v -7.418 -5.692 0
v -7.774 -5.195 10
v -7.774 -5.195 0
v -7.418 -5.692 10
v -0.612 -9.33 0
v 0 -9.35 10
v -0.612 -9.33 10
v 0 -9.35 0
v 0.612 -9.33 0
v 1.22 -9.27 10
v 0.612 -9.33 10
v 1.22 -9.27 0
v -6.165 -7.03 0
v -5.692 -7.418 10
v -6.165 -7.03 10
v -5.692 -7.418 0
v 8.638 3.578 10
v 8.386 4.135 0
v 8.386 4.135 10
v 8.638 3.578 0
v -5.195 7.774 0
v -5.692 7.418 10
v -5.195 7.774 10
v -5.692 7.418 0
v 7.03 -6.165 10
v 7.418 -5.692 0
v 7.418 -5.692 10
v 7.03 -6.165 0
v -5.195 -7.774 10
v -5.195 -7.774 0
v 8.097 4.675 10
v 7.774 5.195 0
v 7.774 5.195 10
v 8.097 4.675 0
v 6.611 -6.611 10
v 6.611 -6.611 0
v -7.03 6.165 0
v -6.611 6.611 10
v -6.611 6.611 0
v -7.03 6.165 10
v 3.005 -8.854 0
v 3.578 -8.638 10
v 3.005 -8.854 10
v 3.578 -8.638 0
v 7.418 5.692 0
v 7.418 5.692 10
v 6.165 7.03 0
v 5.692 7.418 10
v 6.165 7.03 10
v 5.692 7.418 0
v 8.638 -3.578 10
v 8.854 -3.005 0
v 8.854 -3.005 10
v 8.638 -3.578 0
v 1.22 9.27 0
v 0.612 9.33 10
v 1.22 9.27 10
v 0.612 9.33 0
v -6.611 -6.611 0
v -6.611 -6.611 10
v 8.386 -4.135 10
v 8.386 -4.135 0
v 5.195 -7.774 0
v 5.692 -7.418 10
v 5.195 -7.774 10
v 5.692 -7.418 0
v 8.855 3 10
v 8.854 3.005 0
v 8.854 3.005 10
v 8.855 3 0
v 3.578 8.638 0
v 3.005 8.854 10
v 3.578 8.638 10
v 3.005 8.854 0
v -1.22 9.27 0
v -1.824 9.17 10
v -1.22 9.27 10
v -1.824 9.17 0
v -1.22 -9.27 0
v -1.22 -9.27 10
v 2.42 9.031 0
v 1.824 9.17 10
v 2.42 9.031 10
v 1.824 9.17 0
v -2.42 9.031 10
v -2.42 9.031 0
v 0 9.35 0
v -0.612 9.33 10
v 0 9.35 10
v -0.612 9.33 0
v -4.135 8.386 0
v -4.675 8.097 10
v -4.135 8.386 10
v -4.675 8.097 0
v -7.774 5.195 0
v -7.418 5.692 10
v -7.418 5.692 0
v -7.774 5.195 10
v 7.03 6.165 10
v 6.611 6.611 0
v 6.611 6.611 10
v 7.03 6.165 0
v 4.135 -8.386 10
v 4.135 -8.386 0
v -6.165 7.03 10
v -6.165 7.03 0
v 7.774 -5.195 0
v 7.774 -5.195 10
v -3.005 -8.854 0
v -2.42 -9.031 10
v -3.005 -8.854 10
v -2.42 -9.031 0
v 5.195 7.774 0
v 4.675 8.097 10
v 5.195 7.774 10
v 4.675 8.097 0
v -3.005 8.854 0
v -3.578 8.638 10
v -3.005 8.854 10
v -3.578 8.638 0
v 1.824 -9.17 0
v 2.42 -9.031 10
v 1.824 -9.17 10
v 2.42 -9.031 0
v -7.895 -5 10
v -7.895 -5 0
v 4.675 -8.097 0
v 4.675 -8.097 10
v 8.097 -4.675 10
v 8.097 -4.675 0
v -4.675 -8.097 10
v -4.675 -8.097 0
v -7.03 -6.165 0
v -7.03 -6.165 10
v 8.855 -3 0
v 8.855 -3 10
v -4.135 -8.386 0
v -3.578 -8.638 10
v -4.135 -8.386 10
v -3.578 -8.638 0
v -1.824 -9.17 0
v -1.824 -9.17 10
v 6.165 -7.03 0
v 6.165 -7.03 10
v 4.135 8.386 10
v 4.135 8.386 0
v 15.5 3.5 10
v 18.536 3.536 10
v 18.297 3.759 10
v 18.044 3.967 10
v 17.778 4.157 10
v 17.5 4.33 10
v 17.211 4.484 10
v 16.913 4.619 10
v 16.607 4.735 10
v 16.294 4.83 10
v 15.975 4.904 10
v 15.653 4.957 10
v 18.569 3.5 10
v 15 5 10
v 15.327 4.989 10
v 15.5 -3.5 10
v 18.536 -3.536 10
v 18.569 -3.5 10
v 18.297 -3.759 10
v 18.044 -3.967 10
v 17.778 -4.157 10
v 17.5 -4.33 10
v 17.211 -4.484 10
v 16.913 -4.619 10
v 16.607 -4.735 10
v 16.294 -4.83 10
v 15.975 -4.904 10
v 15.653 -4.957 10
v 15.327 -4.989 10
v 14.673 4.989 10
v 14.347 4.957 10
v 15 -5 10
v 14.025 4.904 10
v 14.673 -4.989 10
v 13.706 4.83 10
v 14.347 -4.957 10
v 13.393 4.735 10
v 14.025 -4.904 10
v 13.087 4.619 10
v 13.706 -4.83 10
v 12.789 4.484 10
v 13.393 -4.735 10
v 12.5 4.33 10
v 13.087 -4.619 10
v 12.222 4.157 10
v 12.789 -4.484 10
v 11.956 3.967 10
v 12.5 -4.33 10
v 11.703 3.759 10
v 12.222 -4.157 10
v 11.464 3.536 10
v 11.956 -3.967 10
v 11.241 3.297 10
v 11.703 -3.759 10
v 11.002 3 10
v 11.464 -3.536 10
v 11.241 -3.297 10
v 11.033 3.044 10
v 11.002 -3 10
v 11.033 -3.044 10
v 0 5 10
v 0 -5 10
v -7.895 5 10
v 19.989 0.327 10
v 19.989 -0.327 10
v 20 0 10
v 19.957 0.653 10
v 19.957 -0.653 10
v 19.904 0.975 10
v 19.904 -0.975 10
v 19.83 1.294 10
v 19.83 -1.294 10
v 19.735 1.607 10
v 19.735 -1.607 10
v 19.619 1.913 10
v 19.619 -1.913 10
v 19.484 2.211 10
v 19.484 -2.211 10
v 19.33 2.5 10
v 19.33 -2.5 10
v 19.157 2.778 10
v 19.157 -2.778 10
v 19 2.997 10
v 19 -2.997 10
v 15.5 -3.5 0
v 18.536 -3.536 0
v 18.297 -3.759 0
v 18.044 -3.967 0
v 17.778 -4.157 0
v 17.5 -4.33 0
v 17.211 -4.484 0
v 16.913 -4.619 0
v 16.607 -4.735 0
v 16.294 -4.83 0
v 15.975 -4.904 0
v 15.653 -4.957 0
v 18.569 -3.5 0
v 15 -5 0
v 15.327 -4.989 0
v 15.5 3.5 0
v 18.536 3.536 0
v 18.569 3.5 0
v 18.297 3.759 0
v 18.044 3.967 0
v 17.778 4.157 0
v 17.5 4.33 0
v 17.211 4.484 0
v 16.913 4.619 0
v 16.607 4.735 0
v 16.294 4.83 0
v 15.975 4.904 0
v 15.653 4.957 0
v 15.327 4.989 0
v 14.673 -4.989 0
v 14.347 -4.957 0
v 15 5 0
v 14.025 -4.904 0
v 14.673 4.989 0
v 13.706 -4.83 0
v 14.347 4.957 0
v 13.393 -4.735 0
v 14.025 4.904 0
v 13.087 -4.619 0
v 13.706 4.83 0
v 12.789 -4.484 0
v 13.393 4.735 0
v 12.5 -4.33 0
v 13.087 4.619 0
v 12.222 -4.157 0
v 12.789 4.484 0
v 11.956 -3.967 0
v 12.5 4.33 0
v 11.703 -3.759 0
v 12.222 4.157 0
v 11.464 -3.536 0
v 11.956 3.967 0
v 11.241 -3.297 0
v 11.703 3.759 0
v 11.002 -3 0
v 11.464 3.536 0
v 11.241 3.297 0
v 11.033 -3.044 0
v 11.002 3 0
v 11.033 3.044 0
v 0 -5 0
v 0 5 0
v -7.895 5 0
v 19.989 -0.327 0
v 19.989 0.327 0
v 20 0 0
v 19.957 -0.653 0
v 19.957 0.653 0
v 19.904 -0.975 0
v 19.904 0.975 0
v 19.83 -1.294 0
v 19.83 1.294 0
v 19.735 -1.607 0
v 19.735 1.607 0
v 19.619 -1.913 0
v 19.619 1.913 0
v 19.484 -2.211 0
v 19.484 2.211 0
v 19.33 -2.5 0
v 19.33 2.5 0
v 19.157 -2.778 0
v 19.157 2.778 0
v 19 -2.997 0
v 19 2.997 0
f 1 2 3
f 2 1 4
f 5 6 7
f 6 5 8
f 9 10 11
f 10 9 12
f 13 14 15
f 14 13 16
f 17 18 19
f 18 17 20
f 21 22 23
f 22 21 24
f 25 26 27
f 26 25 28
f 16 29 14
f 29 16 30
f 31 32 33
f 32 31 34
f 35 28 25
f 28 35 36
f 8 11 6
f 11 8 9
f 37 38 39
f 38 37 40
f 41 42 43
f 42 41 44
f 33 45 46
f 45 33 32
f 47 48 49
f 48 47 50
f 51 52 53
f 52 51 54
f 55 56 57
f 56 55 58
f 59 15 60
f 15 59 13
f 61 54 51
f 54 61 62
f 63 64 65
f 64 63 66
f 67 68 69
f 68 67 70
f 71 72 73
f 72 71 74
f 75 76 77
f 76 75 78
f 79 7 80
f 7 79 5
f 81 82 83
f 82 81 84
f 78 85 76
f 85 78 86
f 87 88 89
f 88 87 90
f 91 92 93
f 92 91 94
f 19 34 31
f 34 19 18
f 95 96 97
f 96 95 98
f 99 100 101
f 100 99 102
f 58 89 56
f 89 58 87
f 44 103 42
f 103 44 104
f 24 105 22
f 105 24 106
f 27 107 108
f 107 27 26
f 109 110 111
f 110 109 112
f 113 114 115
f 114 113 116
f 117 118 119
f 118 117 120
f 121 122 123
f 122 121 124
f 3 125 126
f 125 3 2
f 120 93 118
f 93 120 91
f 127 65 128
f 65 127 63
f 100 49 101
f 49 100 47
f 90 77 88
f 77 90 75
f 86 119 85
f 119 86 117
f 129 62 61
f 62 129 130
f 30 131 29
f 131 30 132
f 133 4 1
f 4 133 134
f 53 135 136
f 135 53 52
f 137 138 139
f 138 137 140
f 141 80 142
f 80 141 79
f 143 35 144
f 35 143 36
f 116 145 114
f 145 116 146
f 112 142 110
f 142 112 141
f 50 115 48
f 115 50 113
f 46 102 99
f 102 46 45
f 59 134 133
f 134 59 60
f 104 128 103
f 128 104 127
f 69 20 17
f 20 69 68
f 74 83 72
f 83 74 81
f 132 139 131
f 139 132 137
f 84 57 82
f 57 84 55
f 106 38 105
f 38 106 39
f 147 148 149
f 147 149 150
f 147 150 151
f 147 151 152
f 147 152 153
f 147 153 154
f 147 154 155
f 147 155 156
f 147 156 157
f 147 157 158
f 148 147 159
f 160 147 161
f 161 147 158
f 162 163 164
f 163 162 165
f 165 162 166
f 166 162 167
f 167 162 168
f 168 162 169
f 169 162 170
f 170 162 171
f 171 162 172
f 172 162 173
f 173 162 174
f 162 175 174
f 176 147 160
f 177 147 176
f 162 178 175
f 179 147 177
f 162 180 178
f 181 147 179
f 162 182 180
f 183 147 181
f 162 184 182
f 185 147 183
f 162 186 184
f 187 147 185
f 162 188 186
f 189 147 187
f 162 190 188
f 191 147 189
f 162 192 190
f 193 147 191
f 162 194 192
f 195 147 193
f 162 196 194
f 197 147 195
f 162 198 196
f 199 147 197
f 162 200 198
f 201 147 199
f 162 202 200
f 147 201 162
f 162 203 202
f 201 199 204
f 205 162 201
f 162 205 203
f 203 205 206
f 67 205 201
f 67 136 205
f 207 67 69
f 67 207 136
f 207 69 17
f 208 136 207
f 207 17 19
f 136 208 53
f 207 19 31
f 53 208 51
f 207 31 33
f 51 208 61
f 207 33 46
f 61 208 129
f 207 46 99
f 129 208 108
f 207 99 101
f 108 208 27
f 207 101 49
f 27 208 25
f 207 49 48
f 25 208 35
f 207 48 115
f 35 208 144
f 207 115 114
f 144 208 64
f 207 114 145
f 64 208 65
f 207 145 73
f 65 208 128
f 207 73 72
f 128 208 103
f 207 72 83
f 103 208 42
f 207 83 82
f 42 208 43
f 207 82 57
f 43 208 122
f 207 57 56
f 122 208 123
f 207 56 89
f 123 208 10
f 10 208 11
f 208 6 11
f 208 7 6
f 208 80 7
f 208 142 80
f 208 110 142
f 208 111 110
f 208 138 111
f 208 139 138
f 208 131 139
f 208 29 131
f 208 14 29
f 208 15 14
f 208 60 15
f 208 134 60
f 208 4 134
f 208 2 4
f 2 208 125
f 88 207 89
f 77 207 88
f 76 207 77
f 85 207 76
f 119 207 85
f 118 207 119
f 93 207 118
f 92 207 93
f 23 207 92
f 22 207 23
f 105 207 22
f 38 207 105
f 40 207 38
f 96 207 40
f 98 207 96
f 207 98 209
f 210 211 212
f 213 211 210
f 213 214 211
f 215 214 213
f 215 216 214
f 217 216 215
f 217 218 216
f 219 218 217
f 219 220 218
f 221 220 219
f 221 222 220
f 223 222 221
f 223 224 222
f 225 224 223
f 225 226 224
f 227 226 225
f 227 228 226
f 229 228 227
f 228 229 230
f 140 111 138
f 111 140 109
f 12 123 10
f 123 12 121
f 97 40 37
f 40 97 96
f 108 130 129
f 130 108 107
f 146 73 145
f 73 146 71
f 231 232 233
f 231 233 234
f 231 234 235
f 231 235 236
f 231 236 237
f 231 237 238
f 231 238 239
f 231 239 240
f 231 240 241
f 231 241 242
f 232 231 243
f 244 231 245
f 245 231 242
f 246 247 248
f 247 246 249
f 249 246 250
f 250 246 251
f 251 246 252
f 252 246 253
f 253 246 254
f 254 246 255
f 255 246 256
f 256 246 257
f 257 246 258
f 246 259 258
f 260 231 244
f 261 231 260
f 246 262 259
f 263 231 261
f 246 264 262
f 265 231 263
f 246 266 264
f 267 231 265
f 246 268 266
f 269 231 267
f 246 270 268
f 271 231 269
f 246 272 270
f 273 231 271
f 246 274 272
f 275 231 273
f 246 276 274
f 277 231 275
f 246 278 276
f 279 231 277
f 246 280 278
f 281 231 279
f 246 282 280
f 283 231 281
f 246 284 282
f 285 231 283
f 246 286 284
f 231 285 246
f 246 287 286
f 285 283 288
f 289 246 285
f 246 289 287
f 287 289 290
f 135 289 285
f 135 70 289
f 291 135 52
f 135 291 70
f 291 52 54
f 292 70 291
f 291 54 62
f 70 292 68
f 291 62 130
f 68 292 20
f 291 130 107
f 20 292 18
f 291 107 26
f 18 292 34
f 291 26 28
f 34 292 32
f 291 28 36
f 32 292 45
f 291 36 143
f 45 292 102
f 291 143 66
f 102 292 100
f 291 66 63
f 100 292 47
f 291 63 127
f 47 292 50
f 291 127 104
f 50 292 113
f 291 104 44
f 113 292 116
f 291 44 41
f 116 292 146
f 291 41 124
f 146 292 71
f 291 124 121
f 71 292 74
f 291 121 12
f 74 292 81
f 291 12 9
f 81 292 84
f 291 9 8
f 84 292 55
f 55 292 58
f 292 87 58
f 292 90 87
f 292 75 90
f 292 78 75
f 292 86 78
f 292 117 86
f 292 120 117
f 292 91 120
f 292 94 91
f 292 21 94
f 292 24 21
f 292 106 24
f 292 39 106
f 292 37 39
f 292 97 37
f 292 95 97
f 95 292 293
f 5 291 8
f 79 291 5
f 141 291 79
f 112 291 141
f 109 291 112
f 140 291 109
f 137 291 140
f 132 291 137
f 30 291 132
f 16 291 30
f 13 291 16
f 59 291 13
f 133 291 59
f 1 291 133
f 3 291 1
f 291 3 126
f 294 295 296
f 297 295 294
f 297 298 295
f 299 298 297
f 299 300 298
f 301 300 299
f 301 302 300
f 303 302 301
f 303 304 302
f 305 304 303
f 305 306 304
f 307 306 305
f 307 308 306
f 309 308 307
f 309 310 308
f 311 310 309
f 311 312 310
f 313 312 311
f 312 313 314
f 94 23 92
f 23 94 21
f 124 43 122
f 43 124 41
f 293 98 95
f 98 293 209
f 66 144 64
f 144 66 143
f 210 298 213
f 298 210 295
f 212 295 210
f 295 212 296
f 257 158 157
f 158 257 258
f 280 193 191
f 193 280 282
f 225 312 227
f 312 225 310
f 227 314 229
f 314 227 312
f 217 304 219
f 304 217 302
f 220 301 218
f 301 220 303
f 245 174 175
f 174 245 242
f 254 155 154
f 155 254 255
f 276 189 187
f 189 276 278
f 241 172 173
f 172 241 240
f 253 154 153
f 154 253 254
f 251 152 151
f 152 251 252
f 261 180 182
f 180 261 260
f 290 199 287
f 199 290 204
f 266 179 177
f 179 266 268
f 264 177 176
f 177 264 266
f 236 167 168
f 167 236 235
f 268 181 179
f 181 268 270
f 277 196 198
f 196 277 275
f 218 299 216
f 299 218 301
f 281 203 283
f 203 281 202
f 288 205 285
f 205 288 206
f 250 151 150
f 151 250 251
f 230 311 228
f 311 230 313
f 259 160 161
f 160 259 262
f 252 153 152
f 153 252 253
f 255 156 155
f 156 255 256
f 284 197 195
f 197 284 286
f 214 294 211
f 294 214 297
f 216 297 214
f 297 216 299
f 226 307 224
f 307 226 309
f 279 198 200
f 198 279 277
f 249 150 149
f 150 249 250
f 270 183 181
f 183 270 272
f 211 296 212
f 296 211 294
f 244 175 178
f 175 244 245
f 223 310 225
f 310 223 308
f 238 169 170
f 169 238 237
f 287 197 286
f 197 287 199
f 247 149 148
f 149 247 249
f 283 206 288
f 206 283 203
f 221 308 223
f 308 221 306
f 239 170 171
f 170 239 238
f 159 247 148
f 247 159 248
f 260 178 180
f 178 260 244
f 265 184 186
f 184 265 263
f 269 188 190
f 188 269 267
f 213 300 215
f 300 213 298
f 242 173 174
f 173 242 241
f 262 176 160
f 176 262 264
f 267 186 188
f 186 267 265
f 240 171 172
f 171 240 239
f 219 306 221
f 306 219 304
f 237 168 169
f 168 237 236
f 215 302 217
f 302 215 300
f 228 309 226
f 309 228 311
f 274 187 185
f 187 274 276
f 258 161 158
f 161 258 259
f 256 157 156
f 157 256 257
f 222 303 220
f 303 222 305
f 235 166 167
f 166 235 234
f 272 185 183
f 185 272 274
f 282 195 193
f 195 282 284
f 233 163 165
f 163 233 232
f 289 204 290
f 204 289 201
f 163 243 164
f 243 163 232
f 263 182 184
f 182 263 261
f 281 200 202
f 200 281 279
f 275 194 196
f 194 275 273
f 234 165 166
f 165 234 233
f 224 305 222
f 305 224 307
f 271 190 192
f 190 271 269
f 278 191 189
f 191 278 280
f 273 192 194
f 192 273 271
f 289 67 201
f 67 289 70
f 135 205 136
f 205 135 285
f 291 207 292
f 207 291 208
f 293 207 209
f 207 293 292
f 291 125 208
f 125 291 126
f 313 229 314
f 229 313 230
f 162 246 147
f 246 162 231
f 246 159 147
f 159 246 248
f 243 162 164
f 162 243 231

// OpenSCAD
// Tubing clip for 12.7 mm stand rod
// Print orientation: flat on bed, extruded upward in Z

$fn = 96;
h      = 10;    // extrusion height
ring1_d = 12.7; // rod ring inner diameter
ring1_w = 3;    // rod ring wall
ring1_o = ring1_d + 2*ring1_w; // rod ring outer diameter (18.7)
ring2_d = 6;    // tubing ring inner diameter
ring2_w = 2;    // tubing ring wall
ring2_o = ring2_d + 2*ring2_w; // tubing ring outer diameter (10)
ring2_x = 15;   // tubing ring centre X
bridge_w = 6;   // bridge width (Y)
bridge_x1 = 8;  // bridge start X
bridge_x2 = 12; // bridge end X
eps = 0.5;      // cut overshoot

difference() {
    union() {
        // rod ring
        cylinder(d = ring1_o, h = h);
        // tubing ring
        translate([ring2_x, 0, 0])
            cylinder(d = ring2_o, h = h);
        // bridge
        translate([bridge_x1, -bridge_w/2, 0])
            cube([bridge_x2 - bridge_x1, bridge_w, h]);
    }
    // rod ring opening (-X side)
    translate([-ring1_o/2 - eps, -5, -eps])
        cube([ring1_o/2 + eps, 10, h + 2*eps]);
    // tubing ring opening (+X side)
    translate([ring2_x + eps, -ring2_d/2 - eps, -eps])
        cube([ring2_d/2 + eps, ring2_d + 2*eps, h + 2*eps]);
}
